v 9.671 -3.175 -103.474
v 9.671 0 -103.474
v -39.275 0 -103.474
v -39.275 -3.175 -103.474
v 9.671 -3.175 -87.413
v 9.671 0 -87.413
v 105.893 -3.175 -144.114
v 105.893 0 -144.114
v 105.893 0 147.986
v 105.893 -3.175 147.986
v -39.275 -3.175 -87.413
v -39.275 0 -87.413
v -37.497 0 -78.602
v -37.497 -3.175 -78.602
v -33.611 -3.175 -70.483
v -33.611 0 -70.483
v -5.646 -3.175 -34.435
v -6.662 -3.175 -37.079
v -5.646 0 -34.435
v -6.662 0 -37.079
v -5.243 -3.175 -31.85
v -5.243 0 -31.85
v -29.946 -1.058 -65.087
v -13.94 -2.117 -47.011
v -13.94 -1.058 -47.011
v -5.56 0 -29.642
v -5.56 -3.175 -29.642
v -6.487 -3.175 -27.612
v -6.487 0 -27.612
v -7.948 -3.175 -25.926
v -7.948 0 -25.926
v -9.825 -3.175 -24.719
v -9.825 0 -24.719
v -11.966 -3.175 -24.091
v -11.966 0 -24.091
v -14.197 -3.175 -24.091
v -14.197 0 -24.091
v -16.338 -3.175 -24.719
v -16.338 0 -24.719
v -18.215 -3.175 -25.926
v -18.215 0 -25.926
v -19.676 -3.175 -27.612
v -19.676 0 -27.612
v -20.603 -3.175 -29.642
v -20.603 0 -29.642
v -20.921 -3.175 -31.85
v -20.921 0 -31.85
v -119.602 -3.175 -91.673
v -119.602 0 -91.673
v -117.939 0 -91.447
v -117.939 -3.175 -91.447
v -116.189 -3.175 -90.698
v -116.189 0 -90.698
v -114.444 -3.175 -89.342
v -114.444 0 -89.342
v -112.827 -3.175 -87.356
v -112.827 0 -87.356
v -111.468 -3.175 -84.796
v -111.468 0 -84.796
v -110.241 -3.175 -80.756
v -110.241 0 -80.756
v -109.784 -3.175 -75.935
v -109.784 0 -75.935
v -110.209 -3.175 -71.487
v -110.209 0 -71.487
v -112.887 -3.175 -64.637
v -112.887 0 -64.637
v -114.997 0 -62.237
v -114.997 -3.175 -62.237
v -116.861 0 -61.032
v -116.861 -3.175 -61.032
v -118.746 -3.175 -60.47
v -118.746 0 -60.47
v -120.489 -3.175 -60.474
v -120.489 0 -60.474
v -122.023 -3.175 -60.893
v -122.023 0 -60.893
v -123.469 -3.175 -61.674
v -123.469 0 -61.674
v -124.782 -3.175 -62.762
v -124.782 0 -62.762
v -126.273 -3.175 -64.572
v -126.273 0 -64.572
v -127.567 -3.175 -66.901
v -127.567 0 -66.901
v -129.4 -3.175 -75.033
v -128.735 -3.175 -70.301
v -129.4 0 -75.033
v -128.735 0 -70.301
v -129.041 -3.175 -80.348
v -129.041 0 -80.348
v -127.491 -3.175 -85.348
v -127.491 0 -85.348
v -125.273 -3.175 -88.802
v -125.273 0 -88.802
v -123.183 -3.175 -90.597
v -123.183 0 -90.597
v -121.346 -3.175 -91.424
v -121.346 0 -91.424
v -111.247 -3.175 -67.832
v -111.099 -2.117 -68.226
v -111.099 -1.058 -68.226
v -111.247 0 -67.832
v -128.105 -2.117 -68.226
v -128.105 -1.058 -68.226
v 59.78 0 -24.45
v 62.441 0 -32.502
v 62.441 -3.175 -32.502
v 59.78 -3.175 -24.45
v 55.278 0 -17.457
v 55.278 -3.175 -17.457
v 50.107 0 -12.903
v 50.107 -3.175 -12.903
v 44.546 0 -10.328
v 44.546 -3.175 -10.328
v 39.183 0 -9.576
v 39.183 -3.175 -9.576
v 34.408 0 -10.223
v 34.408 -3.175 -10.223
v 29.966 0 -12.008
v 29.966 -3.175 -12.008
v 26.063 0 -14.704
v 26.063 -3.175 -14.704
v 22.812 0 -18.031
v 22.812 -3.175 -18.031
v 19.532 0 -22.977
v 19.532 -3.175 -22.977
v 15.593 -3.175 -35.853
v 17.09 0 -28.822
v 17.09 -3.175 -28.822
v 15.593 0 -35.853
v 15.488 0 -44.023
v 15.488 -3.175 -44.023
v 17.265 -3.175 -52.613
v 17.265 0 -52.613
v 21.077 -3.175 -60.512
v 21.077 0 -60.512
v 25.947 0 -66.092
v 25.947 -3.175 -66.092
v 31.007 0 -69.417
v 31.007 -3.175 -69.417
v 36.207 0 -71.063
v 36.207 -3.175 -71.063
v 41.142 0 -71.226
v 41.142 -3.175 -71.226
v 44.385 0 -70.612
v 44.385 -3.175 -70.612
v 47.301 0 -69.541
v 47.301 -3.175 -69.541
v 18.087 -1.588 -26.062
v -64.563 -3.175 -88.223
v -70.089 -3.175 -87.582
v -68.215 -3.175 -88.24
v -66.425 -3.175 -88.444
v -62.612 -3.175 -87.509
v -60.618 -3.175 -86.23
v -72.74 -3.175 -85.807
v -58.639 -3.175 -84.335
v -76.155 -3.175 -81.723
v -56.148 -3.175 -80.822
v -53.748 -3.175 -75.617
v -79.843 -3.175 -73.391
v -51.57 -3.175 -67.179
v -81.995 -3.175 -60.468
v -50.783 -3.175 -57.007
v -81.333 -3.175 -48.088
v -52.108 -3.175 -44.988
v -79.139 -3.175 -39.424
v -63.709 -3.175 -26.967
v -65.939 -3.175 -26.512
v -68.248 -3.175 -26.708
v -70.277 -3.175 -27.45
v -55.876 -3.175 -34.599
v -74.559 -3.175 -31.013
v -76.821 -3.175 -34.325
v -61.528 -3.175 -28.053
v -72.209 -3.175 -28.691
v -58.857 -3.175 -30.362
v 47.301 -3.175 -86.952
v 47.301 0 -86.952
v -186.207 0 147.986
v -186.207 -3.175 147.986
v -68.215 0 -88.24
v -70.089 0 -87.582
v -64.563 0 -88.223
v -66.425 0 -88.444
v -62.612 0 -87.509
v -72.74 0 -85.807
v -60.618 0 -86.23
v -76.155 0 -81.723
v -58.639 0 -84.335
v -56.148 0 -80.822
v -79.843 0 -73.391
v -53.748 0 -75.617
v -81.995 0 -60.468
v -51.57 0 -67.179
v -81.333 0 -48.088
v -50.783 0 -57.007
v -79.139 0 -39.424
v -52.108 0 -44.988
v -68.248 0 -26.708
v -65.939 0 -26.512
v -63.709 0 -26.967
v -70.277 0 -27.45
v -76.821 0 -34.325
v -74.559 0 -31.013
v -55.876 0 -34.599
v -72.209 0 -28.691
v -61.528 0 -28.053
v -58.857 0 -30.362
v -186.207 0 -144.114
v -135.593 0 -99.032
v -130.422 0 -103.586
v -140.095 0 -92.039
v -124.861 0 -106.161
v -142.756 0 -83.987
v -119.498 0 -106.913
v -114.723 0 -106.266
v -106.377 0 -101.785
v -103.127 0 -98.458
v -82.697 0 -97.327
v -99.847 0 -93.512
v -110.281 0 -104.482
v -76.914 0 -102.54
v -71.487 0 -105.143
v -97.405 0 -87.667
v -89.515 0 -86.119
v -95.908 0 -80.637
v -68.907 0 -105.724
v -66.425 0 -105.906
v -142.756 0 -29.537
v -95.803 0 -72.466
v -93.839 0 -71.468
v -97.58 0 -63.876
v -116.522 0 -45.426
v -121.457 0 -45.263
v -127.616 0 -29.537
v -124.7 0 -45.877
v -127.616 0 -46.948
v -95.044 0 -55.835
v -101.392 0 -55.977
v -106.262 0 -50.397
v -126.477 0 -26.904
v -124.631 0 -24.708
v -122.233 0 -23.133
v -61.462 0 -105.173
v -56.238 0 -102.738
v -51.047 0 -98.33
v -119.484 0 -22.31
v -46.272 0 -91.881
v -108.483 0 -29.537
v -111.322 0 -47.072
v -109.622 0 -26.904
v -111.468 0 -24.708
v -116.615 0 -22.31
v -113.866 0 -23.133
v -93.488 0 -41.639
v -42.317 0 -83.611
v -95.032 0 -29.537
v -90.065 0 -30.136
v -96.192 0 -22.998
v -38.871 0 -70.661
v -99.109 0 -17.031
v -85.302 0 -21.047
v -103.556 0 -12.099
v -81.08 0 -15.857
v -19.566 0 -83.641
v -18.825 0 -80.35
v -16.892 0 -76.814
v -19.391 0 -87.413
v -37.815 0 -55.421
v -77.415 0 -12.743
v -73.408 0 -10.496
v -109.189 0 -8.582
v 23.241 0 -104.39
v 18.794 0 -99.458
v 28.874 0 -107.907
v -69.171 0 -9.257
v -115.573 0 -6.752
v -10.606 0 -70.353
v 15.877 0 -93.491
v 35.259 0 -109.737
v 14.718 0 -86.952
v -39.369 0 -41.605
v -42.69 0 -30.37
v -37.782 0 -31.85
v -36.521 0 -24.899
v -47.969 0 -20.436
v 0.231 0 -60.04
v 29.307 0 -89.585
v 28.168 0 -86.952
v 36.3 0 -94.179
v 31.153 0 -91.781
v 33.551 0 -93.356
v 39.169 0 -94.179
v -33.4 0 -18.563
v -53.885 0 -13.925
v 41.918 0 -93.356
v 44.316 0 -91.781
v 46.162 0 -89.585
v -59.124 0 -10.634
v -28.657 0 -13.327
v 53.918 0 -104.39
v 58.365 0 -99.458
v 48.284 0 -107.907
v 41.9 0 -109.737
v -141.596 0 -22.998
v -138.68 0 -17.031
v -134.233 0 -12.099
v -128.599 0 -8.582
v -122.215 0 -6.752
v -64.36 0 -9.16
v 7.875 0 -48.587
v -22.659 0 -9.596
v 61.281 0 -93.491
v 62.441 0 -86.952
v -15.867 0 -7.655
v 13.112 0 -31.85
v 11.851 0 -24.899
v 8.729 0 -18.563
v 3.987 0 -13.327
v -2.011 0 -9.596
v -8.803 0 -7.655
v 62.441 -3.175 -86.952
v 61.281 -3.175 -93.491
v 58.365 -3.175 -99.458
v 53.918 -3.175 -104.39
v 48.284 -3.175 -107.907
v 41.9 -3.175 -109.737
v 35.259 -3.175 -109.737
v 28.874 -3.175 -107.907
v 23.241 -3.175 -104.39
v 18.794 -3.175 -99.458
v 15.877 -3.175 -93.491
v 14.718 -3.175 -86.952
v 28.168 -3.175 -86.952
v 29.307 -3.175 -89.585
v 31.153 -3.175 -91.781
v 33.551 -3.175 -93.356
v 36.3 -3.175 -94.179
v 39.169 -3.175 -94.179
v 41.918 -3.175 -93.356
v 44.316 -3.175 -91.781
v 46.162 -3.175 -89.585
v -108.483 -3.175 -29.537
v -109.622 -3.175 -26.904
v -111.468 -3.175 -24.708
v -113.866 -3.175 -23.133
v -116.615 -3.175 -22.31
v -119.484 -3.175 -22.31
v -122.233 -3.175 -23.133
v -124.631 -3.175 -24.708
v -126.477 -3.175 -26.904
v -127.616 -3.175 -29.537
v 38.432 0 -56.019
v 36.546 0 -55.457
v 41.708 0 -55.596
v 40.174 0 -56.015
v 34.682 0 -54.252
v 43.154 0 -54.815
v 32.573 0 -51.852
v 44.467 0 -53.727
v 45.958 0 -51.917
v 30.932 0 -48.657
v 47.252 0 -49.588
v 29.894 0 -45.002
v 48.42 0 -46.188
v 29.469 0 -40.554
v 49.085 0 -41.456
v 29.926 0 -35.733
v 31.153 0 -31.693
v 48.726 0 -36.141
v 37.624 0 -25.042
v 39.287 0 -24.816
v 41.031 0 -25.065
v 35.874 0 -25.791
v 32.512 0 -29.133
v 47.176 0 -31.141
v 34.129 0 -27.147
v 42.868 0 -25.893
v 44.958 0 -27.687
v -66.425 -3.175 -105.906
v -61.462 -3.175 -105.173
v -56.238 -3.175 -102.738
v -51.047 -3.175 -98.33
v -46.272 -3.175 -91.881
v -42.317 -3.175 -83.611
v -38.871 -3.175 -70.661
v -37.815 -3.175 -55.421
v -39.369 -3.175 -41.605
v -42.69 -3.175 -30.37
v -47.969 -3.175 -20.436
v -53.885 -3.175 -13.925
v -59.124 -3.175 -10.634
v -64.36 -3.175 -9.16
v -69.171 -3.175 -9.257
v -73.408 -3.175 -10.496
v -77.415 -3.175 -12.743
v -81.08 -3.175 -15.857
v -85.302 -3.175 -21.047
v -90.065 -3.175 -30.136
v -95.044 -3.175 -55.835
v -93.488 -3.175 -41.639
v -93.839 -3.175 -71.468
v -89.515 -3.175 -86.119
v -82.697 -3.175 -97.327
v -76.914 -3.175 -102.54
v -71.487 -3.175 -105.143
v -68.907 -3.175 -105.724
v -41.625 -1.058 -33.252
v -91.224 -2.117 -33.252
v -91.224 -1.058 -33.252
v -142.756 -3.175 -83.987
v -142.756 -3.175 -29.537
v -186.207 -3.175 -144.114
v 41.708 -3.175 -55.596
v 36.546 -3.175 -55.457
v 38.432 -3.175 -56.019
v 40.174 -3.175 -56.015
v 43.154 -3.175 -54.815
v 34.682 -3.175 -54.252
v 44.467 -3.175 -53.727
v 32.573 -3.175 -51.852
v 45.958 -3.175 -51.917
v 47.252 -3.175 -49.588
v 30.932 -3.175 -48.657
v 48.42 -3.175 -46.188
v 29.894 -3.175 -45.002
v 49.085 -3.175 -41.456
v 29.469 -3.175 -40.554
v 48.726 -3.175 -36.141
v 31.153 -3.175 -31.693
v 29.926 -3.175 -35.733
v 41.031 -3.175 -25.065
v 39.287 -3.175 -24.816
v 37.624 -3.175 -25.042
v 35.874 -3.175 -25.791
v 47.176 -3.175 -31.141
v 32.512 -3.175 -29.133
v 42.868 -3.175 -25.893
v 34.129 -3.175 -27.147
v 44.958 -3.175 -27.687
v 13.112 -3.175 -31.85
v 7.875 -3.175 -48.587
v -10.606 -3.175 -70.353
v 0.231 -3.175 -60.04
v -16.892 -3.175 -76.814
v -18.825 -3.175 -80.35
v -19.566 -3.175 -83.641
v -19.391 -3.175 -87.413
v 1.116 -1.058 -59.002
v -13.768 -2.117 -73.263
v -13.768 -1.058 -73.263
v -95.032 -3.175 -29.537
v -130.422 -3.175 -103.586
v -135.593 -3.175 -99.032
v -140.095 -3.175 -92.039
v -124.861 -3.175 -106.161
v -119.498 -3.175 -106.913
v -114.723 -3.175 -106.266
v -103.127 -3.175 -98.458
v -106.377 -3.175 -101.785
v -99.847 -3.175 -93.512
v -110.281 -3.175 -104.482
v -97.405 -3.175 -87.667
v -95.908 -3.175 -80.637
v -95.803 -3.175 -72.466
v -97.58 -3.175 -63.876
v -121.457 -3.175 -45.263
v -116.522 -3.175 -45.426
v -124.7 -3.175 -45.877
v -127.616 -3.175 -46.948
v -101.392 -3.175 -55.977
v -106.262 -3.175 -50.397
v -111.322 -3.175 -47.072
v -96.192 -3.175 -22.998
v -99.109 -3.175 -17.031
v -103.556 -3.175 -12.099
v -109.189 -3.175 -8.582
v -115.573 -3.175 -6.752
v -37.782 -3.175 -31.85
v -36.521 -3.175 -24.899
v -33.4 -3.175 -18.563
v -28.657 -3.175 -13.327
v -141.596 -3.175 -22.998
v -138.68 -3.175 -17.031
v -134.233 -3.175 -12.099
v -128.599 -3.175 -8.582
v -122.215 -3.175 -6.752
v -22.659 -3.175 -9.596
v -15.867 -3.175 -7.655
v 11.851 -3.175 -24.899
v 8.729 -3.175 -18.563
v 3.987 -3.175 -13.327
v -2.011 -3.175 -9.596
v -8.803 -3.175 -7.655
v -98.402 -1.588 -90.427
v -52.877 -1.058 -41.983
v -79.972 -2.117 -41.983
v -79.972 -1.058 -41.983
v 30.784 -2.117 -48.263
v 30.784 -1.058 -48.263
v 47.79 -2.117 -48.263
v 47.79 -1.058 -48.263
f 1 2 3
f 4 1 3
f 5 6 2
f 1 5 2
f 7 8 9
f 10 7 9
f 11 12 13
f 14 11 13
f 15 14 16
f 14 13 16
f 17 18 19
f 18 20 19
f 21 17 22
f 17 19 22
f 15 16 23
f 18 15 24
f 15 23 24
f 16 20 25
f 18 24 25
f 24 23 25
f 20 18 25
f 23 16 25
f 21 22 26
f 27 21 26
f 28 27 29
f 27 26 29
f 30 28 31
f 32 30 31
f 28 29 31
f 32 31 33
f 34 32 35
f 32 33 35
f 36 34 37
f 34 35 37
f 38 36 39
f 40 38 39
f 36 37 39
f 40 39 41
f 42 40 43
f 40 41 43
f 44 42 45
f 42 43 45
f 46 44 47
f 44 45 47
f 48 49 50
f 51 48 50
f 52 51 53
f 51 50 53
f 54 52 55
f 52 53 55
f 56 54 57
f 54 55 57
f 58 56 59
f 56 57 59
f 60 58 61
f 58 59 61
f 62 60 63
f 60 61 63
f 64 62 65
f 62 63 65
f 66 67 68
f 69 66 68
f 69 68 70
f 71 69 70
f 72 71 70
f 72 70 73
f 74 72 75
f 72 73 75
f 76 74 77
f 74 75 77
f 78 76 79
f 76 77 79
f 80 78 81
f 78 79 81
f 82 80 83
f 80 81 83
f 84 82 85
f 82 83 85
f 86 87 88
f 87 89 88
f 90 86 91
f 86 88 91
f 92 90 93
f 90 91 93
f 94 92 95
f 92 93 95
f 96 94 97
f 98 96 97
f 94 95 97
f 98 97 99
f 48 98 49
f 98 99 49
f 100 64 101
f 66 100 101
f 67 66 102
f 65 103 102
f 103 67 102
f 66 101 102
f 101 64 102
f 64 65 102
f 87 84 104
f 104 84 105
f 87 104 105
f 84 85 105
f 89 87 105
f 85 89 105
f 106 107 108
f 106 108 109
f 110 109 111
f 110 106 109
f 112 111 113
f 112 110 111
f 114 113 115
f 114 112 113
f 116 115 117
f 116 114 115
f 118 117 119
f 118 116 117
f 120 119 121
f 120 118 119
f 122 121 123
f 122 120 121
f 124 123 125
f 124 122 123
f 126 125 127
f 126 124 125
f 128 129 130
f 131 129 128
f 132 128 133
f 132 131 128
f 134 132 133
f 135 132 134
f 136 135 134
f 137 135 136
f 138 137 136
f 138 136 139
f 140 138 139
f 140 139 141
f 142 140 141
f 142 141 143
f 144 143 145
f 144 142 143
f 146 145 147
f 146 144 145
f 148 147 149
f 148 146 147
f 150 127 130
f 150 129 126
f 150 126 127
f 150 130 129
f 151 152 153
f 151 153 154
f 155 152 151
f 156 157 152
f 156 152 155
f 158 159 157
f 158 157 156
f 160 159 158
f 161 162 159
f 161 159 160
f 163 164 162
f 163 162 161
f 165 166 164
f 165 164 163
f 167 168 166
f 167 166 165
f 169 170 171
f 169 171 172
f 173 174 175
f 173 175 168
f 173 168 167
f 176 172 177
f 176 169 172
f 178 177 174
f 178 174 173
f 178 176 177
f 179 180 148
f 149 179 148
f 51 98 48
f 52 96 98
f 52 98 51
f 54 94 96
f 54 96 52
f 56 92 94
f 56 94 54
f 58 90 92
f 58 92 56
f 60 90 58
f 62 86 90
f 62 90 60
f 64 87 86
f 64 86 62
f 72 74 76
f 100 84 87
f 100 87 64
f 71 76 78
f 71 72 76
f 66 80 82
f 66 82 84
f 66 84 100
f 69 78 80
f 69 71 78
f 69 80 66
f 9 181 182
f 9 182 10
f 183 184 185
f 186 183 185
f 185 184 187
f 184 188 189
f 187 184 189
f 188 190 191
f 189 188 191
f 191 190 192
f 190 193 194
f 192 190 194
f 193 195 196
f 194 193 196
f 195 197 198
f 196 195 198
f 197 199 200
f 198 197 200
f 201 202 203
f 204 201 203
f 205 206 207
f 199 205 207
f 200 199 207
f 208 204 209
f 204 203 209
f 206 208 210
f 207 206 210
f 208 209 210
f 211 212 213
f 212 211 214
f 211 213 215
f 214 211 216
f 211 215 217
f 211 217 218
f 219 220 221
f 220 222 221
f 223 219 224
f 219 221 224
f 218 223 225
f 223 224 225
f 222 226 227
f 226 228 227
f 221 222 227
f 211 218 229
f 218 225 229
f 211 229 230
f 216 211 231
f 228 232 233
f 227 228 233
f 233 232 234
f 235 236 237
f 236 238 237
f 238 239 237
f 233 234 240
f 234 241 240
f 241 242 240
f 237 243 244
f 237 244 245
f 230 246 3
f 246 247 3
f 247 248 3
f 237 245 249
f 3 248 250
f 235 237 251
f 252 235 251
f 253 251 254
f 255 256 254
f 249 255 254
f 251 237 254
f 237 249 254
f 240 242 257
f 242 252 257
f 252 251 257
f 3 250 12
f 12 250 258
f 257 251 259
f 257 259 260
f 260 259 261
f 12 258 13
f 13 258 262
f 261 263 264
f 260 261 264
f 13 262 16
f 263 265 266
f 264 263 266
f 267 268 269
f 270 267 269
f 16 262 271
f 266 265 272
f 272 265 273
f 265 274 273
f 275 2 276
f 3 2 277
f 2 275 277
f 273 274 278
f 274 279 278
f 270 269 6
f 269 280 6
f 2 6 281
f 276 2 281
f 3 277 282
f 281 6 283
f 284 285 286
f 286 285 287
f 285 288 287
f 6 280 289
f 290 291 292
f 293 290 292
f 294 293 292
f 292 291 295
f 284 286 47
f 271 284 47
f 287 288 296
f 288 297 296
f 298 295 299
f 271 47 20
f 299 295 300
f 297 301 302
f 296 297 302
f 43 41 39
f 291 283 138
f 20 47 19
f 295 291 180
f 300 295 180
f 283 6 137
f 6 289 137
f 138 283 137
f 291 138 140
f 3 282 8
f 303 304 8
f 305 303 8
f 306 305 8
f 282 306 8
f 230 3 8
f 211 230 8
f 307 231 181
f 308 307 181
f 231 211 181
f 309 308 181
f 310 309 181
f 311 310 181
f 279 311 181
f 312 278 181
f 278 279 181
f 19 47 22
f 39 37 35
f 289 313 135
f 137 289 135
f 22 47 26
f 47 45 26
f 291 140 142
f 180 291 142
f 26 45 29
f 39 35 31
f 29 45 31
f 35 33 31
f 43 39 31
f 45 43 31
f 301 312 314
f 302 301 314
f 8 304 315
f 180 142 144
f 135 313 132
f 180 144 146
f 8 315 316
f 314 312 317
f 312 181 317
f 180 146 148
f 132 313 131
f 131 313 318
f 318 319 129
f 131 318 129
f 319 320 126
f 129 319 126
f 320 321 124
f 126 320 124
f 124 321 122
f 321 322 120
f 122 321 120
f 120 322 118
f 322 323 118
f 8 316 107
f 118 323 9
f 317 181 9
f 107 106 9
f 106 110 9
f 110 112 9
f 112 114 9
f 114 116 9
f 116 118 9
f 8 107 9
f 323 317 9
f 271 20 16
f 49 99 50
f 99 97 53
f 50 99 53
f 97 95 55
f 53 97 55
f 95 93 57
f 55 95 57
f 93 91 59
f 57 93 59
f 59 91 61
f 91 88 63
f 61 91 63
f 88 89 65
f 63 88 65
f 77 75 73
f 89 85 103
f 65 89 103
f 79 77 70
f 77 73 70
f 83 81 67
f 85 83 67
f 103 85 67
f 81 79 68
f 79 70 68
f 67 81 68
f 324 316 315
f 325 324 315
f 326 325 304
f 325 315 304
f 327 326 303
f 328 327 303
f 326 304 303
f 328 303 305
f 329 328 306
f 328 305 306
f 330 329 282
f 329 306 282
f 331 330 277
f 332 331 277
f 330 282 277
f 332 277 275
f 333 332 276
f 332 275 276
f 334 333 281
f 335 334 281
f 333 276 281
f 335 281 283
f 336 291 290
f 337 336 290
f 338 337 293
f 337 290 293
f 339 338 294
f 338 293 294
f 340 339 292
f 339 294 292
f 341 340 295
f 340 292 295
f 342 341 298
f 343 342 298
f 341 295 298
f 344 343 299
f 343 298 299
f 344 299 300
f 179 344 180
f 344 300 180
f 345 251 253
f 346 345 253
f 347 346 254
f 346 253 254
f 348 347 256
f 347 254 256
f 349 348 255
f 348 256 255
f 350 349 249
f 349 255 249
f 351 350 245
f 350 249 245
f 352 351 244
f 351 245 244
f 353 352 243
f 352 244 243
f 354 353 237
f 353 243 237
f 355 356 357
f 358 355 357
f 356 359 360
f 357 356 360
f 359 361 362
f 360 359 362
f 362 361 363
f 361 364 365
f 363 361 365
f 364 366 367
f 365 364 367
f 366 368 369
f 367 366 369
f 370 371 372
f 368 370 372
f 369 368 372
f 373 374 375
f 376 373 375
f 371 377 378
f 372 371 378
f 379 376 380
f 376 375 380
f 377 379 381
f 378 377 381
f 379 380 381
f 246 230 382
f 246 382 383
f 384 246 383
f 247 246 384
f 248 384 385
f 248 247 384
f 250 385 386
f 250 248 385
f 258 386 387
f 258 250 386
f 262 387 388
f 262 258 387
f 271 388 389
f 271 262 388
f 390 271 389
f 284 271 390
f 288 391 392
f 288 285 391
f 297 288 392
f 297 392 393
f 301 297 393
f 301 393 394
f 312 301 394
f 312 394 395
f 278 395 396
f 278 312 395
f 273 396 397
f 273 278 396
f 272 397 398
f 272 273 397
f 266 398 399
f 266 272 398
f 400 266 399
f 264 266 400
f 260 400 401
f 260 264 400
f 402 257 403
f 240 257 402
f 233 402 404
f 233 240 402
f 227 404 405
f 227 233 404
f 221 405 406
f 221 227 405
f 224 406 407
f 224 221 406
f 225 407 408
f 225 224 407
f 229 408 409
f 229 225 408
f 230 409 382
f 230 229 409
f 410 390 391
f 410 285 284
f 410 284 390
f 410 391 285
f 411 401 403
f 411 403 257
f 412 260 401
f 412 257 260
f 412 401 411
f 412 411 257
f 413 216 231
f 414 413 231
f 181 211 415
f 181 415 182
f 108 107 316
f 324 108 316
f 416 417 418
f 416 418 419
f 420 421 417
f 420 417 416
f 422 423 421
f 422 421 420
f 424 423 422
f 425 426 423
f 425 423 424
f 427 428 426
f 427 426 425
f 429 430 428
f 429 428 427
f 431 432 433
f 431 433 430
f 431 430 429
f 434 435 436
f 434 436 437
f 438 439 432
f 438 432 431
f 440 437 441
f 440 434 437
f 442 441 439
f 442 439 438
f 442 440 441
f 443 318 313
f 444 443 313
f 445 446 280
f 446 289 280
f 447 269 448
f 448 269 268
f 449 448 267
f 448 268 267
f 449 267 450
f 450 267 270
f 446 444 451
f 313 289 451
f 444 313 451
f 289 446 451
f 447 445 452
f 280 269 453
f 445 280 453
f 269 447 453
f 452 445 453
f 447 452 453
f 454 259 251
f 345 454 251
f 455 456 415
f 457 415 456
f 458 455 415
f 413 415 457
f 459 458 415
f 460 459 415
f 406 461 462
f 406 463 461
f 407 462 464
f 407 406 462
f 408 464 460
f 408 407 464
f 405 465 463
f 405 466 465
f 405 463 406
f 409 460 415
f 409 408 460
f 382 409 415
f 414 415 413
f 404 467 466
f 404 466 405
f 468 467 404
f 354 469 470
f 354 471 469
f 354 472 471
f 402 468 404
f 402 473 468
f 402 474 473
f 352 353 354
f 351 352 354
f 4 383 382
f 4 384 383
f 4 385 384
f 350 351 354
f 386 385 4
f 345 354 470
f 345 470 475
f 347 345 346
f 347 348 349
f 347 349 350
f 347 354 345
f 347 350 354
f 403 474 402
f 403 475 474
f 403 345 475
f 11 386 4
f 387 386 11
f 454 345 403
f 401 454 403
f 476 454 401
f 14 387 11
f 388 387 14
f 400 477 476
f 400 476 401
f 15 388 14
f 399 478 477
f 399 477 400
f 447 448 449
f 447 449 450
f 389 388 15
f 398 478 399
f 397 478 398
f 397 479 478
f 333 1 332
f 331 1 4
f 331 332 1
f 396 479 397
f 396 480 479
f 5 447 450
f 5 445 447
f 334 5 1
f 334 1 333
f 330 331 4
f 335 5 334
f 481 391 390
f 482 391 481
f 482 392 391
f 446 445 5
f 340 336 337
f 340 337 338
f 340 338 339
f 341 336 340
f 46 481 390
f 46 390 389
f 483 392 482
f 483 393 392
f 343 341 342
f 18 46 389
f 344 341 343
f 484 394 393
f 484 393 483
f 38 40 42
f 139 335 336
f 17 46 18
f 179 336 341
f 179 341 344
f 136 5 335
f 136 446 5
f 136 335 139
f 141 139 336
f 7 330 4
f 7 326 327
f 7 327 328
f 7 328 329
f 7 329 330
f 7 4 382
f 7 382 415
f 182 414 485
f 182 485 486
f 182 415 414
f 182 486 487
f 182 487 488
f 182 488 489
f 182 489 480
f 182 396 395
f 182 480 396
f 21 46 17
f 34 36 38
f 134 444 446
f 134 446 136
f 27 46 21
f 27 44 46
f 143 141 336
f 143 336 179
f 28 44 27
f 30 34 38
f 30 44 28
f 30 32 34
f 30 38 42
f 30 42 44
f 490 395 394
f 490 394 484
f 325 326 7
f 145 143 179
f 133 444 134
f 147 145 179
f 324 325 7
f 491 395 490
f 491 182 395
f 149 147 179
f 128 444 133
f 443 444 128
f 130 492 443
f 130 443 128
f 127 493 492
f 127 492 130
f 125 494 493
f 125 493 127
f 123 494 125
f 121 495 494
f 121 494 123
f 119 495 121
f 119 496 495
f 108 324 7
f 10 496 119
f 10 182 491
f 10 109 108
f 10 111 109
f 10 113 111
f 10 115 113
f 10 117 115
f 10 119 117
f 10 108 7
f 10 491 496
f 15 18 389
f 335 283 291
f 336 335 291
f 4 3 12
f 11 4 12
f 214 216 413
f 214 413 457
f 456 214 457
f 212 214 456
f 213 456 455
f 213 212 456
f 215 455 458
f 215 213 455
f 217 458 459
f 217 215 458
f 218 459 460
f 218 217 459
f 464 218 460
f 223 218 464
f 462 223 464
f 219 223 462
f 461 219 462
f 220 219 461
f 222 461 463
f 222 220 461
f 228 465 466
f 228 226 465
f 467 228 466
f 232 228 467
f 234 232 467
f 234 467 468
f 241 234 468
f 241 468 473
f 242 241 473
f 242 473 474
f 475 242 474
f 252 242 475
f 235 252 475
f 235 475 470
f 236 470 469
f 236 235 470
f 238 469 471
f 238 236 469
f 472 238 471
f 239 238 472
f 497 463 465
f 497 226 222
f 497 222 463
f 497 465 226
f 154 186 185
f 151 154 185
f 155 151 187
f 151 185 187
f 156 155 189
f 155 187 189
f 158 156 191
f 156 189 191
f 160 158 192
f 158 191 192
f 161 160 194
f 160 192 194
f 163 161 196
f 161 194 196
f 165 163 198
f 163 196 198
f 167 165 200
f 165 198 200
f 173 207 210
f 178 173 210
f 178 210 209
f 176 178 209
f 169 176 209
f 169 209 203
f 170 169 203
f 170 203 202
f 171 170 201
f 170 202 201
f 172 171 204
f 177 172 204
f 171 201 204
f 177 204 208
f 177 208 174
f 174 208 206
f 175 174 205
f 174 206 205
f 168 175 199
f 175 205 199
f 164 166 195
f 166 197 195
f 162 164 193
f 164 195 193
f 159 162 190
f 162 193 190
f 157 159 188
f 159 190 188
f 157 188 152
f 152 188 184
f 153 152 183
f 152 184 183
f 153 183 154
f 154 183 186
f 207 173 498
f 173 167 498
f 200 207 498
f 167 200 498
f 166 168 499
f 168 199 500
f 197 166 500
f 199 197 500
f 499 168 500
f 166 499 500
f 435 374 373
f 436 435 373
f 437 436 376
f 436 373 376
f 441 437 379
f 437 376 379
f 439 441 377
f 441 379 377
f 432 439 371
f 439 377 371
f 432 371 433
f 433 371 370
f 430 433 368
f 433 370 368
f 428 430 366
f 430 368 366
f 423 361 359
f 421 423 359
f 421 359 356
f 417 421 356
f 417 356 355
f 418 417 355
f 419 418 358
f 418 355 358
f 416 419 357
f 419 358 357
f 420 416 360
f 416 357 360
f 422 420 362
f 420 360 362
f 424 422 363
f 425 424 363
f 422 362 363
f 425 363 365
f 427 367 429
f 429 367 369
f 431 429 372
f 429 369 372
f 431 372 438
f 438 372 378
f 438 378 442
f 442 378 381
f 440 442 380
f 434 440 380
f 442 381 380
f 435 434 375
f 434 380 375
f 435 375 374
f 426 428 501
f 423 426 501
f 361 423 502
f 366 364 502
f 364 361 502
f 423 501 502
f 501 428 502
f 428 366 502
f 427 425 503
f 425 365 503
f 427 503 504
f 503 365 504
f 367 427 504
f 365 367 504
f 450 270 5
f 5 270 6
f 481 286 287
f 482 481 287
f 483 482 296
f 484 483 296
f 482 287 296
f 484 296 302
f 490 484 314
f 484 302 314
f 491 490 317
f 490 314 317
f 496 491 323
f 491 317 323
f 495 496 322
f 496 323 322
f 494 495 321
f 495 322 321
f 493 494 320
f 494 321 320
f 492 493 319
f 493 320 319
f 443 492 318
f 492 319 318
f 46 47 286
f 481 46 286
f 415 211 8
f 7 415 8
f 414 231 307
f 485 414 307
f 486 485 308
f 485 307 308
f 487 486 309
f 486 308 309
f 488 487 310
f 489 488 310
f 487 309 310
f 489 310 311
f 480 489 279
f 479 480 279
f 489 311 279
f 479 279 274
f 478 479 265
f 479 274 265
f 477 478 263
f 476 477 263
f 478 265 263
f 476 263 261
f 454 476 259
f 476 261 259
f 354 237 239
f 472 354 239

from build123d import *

# Parameters (mm, degrees)
F0_W     = 292.1
F0_H     = 292.1
F1_DEPTH = 3.175


with BuildPart() as f1:
    # F0 (on Front) → F1 (new body)
    with BuildSketch(Plane.XZ):
        with Locations((-40.1574712923, 1.9364418507)):
            Rectangle(F0_W, F0_H)
        with BuildLine():
            ThreePointArc((-142.7557298629, -29.5373028781), (-118.8940867618, -6.520460227), (-95.0324436608, -29.5373028781))
            Line((-95.0324436608, -29.5373028781), (-108.4827767409, -29.5373028781))
            ThreePointArc((-108.4827767409, -29.5373028781), (-118.0494302176, -22.2060663534), (-127.6160836943, -29.5373028781))
            Line((-127.6160836943, -29.5373028781), (-127.6160836943, -46.9478685959))
            add(Edge.make_bspline(
                [(-142.7557298629, -83.987326965), (-126.9738204318, -160.3293840028), (-98.4015956376, -90.4268434154), (-69.8293708434, -20.5243028281), (-127.6160836943, -46.9478685959)],
                knots=[4.9726967666, 4.9726967666, 4.9726967666, 7.3692535387, 7.3692535387, 9.7658103108, 9.7658103108, 9.7658103108], degree=2, weights=[1, 0.3639618282, 1, 0.3639618282, 1]))
            Line((-142.7557298629, -83.987326965), (-142.7557298629, -29.5373028781))
        make_face(mode=Mode.SUBTRACT)
        with BuildLine():
            add(Edge.make_bspline(
                [(-66.4248388269, -105.906184584), (-16.8258911035, -105.906184584), (-41.6253649652, -33.2520364982), (-66.4248388269, 39.4021115876), (-91.2243126886, -33.2520364982), (-116.0237865503, -105.906184584), (-66.4248388269, -105.906184584)],
                knots=[0, 0, 0, 2.0943951024, 2.0943951024, 4.1887902048, 4.1887902048, 6.2831853072, 6.2831853072, 6.2831853072], degree=2, weights=[1, 0.5, 1, 0.5, 1, 0.5, 1]))
        make_face(mode=Mode.SUBTRACT)
        with BuildLine():
            ThreePointArc((-5.2426088433, -31.8500286278), (-13.0815814728, -24.0110559984), (-20.9205541022, -31.8500286278))
            Line((-20.9205541022, -31.8500286278), (-37.7822094142, -31.8500286278))
            ThreePointArc((-37.7822094142, -31.8500286278), (-12.3350775563, -7.4090032919), (13.1120543017, -31.8500286278))
            add(Edge.make_bspline(
                [(13.1120543017, -31.8500286278), (6.6114428313, -69.7065332751), (-22.450112245, -69.0585513461), (-19.3909995049, -87.4132206957)],
                knots=[0, 0, 0, 0, 64.3717082228, 64.3717082228, 64.3717082228, 64.3717082228], degree=3))
            Line((-19.3909995049, -87.4132206957), (9.6705608896, -87.4132206957))
            Line((9.6705608896, -87.4132206957), (9.6705608896, -103.4735581493))
            Line((9.6705608896, -103.4735581493), (-39.2752269973, -103.4735581493))
            Line((-39.2752269973, -103.4735581493), (-39.2752269973, -87.4132206957))
            add(Edge.make_bspline(
                [(-39.2752269973, -87.4132206957), (-37.9446880513, -62.5160173481), (-5.6249974927, -45.9984192894), (-5.2426088433, -31.8500286278)],
                knots=[0, 0, 0, 0, 65.1574048837, 65.1574048837, 65.1574048837, 65.1574048837], degree=3))
        make_face(mode=Mode.SUBTRACT)
        with BuildLine():
            ThreePointArc((62.4407868077, -86.9517425749), (38.5791437066, -109.9685852259), (14.7175006056, -86.9517425749))
            Line((14.7175006056, -86.9517425749), (28.1678336858, -86.9517425749))
            ThreePointArc((28.1678336858, -86.9517425749), (37.7344871624, -94.2829790995), (47.3011406391, -86.9517425749))
            Line((47.3011406391, -86.9517425749), (47.3011406391, -69.541176857))
            add(Edge.make_bspline(
                [(62.4407868077, -32.5017184879), (46.6588773766, 43.8403385498), (18.0866525824, -26.0622020375), (-10.4855722118, -95.9647426249), (47.3011406391, -69.541176857)],
                knots=[4.9726967666, 4.9726967666, 4.9726967666, 7.3692535387, 7.3692535387, 9.7658103108, 9.7658103108, 9.7658103108], degree=2, weights=[1, 0.3639618282, 1, 0.3639618282, 1]))
            Line((62.4407868077, -32.5017184879), (62.4407868077, -86.9517425749))
        make_face(mode=Mode.SUBTRACT)
    extrude(amount=F1_DEPTH)


with BuildPart() as f1b:
    # F0 (on Front) → F1, piece 2 (new body)
    with BuildSketch(Plane.XZ):
        with BuildLine():
            add(Edge.make_bspline(
                [(-66.4248388269, -88.443591274), (-39.3299198243, -88.443591274), (-52.8773793256, -41.9833331532), (-66.4248388269, 4.4769249675), (-79.9722983282, -41.9833331532), (-93.5197578295, -88.443591274), (-66.4248388269, -88.443591274)],
                knots=[0, 0, 0, 2.0943951024, 2.0943951024, 4.1887902048, 4.1887902048, 6.2831853072, 6.2831853072, 6.2831853072], degree=2, weights=[1, 0.5, 1, 0.5, 1, 0.5, 1]))
        make_face()
    extrude(amount=F1_DEPTH)


with BuildPart() as f1c:
    # F0 (on Front) → F1, piece 3 (new body)
    with BuildSketch(Plane.XZ):
        with BuildLine():
            add(Edge.make_bspline(
                [(-119.6021508598, -91.6728613435), (-102.5956020408, -91.6728613435), (-111.0988764503, -68.2260265909), (-119.6021508598, -44.7791918383), (-128.1054252693, -68.2260265909), (-136.6086996787, -91.6728613435), (-119.6021508598, -91.6728613435)],
                knots=[0, 0, 0, 2.0943951024, 2.0943951024, 4.1887902048, 4.1887902048, 6.2831853072, 6.2831853072, 6.2831853072], degree=2, weights=[1, 0.5, 1, 0.5, 1, 0.5, 1]))
        make_face()
    extrude(amount=F1_DEPTH)


with BuildPart() as f1d:
    # F0 (on Front) → F1, piece 4 (new body)
    with BuildSketch(Plane.XZ):
        with BuildLine():
            add(Edge.make_bspline(
                [(39.2872078046, -24.8161841095), (22.2806589856, -24.8161841095), (30.7839333951, -48.2630188621), (39.2872078046, -71.7098536147), (47.7904822141, -48.2630188621), (56.2937566235, -24.8161841095), (39.2872078046, -24.8161841095)],
                knots=[0, 0, 0, 2.0943951024, 2.0943951024, 4.1887902048, 4.1887902048, 6.2831853072, 6.2831853072, 6.2831853072], degree=2, weights=[1, 0.5, 1, 0.5, 1, 0.5, 1]))
        make_face()
    extrude(amount=F1_DEPTH)


solid = Compound([f1.part, f1b.part, f1c.part, f1d.part])
